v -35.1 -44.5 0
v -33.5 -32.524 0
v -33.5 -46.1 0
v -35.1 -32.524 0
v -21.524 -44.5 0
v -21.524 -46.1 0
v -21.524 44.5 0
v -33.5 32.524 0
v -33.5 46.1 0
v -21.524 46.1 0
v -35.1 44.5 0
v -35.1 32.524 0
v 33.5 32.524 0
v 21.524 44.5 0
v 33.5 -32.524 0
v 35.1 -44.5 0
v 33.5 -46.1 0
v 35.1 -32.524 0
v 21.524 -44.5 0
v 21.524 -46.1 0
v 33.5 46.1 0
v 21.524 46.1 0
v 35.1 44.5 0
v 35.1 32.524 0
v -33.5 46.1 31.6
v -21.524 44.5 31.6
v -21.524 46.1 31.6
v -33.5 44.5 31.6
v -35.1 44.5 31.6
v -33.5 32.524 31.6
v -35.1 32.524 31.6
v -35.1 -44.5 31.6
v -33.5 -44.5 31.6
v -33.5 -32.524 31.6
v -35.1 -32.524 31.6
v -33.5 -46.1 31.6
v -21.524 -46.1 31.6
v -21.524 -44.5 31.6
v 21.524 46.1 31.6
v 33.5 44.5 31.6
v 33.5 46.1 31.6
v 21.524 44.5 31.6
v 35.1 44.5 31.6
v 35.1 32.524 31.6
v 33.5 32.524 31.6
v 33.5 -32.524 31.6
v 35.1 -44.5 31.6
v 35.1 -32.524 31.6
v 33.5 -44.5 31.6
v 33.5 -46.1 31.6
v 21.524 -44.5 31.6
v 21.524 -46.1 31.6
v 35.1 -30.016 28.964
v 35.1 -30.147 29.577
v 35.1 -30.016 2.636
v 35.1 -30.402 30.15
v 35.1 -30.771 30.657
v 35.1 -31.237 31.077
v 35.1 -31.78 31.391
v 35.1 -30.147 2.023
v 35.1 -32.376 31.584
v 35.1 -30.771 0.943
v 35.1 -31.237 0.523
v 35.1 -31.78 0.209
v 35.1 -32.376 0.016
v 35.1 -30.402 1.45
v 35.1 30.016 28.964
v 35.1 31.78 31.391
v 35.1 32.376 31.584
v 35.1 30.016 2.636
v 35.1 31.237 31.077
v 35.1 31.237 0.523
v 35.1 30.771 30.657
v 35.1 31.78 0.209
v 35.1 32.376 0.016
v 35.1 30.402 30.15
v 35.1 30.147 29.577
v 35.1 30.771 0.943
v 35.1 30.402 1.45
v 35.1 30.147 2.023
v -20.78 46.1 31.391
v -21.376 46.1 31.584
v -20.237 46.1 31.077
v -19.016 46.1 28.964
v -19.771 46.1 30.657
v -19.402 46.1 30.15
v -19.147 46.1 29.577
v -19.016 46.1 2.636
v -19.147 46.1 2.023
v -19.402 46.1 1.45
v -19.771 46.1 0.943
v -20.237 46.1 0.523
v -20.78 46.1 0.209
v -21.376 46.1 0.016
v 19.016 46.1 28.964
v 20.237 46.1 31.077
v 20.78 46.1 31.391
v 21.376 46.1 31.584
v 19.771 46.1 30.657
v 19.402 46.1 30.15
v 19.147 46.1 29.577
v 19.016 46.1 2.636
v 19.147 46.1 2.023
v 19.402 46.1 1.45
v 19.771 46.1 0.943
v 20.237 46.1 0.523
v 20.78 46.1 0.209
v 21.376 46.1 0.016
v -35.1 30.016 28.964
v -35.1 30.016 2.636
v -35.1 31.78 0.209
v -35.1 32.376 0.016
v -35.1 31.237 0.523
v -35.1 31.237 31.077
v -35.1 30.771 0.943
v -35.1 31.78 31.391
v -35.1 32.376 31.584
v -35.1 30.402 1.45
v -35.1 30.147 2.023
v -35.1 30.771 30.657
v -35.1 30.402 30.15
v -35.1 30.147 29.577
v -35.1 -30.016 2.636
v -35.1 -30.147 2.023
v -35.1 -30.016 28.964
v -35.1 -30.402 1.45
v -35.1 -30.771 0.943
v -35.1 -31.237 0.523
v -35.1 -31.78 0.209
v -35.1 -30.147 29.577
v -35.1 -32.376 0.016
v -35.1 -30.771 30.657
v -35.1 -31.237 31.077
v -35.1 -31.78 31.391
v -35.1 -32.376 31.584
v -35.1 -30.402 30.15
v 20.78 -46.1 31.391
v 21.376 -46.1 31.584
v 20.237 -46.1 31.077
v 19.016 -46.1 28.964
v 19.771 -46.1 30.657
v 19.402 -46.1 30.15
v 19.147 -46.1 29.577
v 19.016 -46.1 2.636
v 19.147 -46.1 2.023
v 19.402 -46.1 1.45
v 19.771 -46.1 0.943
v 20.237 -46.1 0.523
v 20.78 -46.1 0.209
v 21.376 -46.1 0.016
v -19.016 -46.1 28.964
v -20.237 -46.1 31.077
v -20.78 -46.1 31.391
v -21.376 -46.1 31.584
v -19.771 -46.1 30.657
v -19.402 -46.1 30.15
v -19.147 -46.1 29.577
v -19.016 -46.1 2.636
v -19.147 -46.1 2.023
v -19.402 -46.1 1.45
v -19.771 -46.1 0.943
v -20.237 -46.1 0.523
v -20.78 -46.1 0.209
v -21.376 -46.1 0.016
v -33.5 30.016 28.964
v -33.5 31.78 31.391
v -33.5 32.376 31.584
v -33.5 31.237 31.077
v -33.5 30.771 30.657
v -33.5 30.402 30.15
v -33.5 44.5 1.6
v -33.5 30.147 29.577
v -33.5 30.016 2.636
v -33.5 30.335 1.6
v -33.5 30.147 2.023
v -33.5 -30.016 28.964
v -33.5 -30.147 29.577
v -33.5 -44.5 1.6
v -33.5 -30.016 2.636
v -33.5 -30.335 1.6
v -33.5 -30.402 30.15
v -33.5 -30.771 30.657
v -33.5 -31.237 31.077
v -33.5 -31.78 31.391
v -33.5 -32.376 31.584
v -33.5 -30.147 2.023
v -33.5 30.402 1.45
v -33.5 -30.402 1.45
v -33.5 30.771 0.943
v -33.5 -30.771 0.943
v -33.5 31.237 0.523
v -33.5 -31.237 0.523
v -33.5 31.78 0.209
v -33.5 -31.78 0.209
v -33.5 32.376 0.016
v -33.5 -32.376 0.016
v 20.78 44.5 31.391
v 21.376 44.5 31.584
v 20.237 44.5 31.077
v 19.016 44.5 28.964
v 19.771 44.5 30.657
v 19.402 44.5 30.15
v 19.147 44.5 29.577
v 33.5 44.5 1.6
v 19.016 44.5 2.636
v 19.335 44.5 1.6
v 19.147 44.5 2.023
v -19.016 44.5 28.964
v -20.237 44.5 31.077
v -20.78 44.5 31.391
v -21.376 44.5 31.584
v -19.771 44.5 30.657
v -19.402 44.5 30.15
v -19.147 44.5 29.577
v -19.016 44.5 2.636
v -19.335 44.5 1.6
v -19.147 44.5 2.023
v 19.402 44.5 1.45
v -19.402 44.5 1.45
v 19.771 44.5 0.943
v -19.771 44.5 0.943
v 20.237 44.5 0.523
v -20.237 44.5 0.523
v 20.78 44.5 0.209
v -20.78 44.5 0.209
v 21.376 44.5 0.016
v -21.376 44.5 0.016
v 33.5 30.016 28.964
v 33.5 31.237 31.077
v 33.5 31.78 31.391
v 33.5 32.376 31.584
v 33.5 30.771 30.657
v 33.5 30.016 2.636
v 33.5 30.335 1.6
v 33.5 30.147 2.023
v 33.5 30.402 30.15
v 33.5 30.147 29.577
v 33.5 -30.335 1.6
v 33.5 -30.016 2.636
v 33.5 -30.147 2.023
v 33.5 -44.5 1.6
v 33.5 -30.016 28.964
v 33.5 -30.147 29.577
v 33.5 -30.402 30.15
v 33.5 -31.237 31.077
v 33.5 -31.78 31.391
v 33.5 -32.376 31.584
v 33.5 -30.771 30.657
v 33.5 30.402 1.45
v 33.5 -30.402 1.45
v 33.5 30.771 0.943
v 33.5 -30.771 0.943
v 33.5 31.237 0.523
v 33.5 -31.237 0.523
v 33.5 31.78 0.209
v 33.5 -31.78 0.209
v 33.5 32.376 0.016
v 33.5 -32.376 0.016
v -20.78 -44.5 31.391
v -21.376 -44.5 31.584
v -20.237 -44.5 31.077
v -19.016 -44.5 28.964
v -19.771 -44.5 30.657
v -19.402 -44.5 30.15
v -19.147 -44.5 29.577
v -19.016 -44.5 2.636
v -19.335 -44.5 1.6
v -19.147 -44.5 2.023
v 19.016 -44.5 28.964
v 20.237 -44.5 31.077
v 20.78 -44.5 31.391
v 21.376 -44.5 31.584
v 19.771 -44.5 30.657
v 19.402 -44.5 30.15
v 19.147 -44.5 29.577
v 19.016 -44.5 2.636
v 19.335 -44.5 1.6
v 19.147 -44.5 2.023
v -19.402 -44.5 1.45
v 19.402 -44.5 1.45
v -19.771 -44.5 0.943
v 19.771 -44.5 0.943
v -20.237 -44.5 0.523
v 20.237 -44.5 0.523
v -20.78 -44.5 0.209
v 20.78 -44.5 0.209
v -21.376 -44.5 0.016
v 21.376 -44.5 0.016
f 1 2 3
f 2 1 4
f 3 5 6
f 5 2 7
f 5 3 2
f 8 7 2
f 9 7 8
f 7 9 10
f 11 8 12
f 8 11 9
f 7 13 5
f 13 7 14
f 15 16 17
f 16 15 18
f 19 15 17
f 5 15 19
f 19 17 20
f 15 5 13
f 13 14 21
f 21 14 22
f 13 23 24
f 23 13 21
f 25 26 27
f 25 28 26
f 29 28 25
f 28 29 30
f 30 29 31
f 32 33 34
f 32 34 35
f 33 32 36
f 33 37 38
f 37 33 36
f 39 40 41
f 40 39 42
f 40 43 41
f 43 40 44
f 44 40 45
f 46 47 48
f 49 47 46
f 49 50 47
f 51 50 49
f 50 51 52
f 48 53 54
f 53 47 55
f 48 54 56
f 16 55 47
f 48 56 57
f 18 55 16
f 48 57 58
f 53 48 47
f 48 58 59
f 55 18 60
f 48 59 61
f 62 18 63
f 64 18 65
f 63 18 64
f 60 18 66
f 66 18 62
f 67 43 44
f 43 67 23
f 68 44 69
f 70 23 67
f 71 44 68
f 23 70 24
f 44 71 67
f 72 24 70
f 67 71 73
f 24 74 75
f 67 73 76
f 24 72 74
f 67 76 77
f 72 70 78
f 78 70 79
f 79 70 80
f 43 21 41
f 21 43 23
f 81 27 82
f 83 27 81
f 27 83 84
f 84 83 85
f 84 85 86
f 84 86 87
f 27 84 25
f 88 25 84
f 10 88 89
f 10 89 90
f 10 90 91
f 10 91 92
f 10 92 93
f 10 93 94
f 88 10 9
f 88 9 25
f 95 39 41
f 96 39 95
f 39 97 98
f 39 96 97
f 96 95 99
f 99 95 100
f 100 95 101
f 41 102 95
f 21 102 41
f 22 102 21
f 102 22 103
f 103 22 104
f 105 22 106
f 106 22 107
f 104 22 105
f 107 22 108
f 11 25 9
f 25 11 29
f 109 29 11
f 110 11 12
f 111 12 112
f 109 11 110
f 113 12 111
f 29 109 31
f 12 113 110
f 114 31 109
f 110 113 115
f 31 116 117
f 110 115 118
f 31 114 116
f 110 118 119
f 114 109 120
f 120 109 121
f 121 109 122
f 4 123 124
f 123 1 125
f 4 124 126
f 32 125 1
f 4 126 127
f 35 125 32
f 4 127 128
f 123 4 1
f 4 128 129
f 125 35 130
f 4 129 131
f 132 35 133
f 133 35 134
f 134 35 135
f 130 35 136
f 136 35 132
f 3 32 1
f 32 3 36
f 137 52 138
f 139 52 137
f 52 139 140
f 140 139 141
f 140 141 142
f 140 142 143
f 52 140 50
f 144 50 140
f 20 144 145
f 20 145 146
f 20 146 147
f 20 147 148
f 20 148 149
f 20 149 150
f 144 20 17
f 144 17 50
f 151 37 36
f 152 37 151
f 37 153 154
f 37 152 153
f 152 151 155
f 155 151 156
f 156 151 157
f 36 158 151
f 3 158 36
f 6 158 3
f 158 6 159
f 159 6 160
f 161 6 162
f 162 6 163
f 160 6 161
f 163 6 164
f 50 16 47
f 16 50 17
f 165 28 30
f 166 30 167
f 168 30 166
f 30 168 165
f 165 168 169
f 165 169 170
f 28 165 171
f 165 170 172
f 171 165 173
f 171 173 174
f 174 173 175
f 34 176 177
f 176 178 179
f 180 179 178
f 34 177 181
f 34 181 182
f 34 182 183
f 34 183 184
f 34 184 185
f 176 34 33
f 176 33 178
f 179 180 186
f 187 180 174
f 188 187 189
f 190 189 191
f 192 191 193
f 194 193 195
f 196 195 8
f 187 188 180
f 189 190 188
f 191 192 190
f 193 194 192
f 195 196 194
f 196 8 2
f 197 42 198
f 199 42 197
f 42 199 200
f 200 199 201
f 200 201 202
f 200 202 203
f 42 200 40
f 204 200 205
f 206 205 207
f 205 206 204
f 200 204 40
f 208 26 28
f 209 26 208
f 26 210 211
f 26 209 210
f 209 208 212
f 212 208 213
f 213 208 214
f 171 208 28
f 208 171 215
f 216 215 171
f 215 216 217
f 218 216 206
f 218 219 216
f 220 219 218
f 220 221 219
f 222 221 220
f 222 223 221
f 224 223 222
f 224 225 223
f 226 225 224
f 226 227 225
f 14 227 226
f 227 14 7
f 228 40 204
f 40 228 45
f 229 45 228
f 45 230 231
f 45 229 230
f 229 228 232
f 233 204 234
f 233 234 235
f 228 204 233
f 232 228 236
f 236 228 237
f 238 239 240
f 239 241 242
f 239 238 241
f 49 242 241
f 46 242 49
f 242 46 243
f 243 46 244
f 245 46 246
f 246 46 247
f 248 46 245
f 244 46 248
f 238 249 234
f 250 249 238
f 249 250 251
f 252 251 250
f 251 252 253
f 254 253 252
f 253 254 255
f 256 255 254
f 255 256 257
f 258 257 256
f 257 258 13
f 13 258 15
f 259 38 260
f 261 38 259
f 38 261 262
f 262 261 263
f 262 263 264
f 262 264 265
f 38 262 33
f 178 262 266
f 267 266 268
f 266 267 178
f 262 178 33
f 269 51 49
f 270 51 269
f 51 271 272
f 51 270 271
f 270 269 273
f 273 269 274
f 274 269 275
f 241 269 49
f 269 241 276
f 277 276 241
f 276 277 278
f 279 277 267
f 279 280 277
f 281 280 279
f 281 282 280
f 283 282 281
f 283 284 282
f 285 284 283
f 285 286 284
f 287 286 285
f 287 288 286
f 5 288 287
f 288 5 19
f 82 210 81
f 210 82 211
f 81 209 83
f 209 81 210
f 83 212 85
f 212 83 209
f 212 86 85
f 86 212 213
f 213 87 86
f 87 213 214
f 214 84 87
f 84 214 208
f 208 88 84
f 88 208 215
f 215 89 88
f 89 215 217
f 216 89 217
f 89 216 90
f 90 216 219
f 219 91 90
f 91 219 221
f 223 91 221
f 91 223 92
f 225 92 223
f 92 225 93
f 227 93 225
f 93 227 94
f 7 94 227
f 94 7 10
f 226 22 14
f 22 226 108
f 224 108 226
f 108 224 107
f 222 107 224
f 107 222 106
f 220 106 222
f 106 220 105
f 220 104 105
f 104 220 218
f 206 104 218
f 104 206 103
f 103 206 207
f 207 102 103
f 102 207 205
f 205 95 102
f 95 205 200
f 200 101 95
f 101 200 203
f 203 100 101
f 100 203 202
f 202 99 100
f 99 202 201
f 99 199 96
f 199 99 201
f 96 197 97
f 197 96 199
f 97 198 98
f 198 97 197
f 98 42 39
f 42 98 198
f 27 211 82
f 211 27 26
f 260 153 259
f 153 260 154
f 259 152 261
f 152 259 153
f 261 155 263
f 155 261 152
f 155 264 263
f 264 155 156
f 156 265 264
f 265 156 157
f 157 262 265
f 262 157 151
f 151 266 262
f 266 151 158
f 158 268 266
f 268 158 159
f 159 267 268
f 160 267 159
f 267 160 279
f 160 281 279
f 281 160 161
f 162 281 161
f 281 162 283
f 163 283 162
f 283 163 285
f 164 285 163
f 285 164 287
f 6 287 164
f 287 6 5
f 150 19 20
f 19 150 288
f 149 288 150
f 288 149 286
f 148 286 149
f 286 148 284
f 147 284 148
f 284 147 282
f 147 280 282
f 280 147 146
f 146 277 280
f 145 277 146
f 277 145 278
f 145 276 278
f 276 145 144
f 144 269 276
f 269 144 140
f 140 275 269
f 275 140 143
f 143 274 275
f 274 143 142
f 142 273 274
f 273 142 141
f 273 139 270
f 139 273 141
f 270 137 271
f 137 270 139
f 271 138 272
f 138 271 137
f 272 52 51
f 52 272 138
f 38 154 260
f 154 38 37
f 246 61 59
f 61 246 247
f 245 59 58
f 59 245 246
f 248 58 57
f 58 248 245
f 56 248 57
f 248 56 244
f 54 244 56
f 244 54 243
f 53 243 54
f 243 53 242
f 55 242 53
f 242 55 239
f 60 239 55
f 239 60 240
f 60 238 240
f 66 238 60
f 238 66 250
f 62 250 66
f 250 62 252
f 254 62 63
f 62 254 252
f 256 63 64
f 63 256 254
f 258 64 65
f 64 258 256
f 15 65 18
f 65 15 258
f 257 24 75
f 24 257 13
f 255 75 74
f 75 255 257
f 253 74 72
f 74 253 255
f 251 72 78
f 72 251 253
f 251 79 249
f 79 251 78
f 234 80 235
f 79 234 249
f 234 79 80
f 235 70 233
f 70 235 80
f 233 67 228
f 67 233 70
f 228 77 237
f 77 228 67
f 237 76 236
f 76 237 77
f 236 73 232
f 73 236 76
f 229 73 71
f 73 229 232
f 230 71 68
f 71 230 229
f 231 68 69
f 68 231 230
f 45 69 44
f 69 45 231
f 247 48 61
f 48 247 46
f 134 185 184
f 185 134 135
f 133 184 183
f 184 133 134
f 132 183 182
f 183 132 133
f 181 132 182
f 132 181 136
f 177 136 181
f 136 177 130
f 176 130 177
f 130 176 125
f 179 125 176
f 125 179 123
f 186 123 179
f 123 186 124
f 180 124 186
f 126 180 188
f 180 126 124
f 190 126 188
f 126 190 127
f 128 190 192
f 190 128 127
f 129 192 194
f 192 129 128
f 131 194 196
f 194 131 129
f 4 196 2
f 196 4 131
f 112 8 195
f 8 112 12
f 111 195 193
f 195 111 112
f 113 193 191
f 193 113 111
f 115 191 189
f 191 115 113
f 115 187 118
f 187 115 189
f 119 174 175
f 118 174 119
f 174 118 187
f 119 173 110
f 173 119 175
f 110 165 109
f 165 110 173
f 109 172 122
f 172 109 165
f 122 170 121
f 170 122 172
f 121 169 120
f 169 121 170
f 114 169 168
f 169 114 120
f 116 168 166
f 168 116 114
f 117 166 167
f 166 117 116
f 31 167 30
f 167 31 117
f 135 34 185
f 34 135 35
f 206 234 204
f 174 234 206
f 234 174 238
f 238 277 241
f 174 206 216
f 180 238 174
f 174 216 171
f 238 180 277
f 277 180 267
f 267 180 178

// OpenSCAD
// file: ../common/roundedrectdiff.scad
// This creates a square with inverted rounded edges
// usually for subtracting from something else to give that
// object some rounded corners
module rounded_subtraction_square(height, width, radius, segments = 30)
{
    union()
    {
        // base
        square(size = [ height, width ], center = true);

        // right (y+)
        intersection()
        {

            translate([ 0, (width / 2) + (radius / 2), 0 ])
            {
                square(size = [ height, radius ], center = true);
            }

            difference()
            {
                translate([ 0, (width / 2) + radius, 0 ])
                {
                    square(size = [ height, radius * 2 ], center = true);
                }
                hull()
                {
                    translate([ (height / 2) - radius, (width / 2) + radius, 0 ])
                    {
                        circle(r = radius, $fn = segments);
                    }
                    translate([ -((height / 2) - radius), (width / 2) + radius, 0 ])
                    {
                        circle(r = radius, $fn = segments);
                    }
                }
            }
        }

        // left (y-)
        intersection()
        {

            translate([ 0, -((width / 2) + (radius / 2)), 0 ])
            {
                square(size = [ height, radius ], center = true);
            }

            difference()
            {
                translate([ 0, -((width / 2) + radius), 0 ])
                {
                    square(size = [ height, radius * 2 ], center = true);
                }
                hull()
                {
                    translate([ (height / 2) - radius, -((width / 2) + radius), 0 ])
                    {
                        circle(r = radius, $fn = segments);
                    }
                    translate([ -((height / 2) - radius), -((width / 2) + radius), 0 ])
                    {
                        circle(r = radius, $fn = segments);
                    }
                }
            }
        }
    }
}

module rounded_subtraction_square_top(height, width, radius, segments = 30)
{
    union()
    {
        // base
        square(size = [ height, width ], center = true);

        // right (y+)
        intersection()
        {

            translate([ 0, (width / 2) + (radius / 2), 0 ])
            {
                square(size = [ height, radius ], center = true);
            }

            difference()
            {
                translate([ 0, (width / 2) + radius, 0 ])
                {
                    square(size = [ height, radius * 2 ], center = true);
                }
                hull()
                {
                    translate([ (height / 2) - radius, (width / 2) + radius, 0 ])
                    {
                        circle(r = radius, $fn = segments);
                    }
                    translate([ -((height / 2) - radius) * 2, (width / 2) + radius, 0 ])
                    {
                        circle(r = radius, $fn = segments);
                    }
                }
            }
        }

        // left (y-)
        intersection()
        {

            translate([ 0, -((width / 2) + (radius / 2)), 0 ])
            {
                square(size = [ height, radius ], center = true);
            }

            difference()
            {
                translate([ 0, -((width / 2) + radius), 0 ])
                {
                    square(size = [ height, radius * 2 ], center = true);
                }
                hull()
                {
                    translate([ (height / 2) - radius, -((width / 2) + radius), 0 ])
                    {
                        circle(r = radius, $fn = segments);
                    }
                    translate([ -((height / 2) - radius) * 2, -((width / 2) + radius), 0 ])
                    {
                        circle(r = radius, $fn = segments);
                    }
                }
            }
        }
    }
}

rounded_subtraction_square_top(20, 10, 3);
// main file
use <../common/roundedrectdiff.scad>;
width = 66;
height = 88;
depth = 30;
margin = 1;
buffer = 4;
thickness = 0.4 * buffer;

union()
{
    difference()
    {
        linear_extrude(depth + thickness)
        {
            difference()
            {
                offset(thickness)
                {
                    square([ width + margin, height + margin ], center = true);
                }
                square([ width + margin, height + margin ], center = true);
            }
        }

        // translate([ 0, 0, 0 ])
        // {
        //     linear_extrude(height = thickness + depth + 1)
        //     {
        //         translate([ 0, height / 2, 0 ])
        //         {
        //             square([ 20, 20 ], center = true);
        //         }
        //     }
        // }
        color("red")
        {
            translate([ 0, (height / 2) + (thickness * 1.4), (thickness / 2) + (depth / 2) ])
            {
                rotate([ 90, 90, 0 ])
                {
                    linear_extrude(thickness * 2)
                    {
                        {
                            rounded_subtraction_square(height = thickness + depth + 0.1, width = 38, radius = 3);
                        }
                    }
                }
            }
        }
        color("green")
        {
            translate([ 0, -((height / 2)), (thickness / 2) + (depth / 2) ])
            {
                rotate([ 90, 90, 0 ])
                {
                    linear_extrude(thickness * 2)
                    {
                        {
                            rounded_subtraction_square(height = thickness + depth + 0.1, width = 38, radius = 3);
                        }
                    }
                }
            }
        }
        color("green")
        {
            translate([ width / 2, 0, (thickness / 2) + (depth / 2) ])
            {
                rotate([ 90, 90, 90 ])
                {
                    linear_extrude(thickness * 2)
                    {
                        {
                            rounded_subtraction_square(height = thickness + depth + 0.1, width = 60, radius = 3);
                        }
                    }
                }
            }
        }
        color("green")
        {
            translate([ -(width / 2) - thickness * 1.4, 0, (thickness / 2) + (depth / 2) ])
            {
                rotate([ 90, 90, 90 ])
                {
                    linear_extrude(thickness * 2)
                    {
                        {
                            rounded_subtraction_square(height = thickness + depth + 0.1, width = 60, radius = 3);
                        }
                    }
                }
            }
        }
    }

    linear_extrude(thickness)
    {
        square([ width + margin, height + margin ], center = true);
    }
}
